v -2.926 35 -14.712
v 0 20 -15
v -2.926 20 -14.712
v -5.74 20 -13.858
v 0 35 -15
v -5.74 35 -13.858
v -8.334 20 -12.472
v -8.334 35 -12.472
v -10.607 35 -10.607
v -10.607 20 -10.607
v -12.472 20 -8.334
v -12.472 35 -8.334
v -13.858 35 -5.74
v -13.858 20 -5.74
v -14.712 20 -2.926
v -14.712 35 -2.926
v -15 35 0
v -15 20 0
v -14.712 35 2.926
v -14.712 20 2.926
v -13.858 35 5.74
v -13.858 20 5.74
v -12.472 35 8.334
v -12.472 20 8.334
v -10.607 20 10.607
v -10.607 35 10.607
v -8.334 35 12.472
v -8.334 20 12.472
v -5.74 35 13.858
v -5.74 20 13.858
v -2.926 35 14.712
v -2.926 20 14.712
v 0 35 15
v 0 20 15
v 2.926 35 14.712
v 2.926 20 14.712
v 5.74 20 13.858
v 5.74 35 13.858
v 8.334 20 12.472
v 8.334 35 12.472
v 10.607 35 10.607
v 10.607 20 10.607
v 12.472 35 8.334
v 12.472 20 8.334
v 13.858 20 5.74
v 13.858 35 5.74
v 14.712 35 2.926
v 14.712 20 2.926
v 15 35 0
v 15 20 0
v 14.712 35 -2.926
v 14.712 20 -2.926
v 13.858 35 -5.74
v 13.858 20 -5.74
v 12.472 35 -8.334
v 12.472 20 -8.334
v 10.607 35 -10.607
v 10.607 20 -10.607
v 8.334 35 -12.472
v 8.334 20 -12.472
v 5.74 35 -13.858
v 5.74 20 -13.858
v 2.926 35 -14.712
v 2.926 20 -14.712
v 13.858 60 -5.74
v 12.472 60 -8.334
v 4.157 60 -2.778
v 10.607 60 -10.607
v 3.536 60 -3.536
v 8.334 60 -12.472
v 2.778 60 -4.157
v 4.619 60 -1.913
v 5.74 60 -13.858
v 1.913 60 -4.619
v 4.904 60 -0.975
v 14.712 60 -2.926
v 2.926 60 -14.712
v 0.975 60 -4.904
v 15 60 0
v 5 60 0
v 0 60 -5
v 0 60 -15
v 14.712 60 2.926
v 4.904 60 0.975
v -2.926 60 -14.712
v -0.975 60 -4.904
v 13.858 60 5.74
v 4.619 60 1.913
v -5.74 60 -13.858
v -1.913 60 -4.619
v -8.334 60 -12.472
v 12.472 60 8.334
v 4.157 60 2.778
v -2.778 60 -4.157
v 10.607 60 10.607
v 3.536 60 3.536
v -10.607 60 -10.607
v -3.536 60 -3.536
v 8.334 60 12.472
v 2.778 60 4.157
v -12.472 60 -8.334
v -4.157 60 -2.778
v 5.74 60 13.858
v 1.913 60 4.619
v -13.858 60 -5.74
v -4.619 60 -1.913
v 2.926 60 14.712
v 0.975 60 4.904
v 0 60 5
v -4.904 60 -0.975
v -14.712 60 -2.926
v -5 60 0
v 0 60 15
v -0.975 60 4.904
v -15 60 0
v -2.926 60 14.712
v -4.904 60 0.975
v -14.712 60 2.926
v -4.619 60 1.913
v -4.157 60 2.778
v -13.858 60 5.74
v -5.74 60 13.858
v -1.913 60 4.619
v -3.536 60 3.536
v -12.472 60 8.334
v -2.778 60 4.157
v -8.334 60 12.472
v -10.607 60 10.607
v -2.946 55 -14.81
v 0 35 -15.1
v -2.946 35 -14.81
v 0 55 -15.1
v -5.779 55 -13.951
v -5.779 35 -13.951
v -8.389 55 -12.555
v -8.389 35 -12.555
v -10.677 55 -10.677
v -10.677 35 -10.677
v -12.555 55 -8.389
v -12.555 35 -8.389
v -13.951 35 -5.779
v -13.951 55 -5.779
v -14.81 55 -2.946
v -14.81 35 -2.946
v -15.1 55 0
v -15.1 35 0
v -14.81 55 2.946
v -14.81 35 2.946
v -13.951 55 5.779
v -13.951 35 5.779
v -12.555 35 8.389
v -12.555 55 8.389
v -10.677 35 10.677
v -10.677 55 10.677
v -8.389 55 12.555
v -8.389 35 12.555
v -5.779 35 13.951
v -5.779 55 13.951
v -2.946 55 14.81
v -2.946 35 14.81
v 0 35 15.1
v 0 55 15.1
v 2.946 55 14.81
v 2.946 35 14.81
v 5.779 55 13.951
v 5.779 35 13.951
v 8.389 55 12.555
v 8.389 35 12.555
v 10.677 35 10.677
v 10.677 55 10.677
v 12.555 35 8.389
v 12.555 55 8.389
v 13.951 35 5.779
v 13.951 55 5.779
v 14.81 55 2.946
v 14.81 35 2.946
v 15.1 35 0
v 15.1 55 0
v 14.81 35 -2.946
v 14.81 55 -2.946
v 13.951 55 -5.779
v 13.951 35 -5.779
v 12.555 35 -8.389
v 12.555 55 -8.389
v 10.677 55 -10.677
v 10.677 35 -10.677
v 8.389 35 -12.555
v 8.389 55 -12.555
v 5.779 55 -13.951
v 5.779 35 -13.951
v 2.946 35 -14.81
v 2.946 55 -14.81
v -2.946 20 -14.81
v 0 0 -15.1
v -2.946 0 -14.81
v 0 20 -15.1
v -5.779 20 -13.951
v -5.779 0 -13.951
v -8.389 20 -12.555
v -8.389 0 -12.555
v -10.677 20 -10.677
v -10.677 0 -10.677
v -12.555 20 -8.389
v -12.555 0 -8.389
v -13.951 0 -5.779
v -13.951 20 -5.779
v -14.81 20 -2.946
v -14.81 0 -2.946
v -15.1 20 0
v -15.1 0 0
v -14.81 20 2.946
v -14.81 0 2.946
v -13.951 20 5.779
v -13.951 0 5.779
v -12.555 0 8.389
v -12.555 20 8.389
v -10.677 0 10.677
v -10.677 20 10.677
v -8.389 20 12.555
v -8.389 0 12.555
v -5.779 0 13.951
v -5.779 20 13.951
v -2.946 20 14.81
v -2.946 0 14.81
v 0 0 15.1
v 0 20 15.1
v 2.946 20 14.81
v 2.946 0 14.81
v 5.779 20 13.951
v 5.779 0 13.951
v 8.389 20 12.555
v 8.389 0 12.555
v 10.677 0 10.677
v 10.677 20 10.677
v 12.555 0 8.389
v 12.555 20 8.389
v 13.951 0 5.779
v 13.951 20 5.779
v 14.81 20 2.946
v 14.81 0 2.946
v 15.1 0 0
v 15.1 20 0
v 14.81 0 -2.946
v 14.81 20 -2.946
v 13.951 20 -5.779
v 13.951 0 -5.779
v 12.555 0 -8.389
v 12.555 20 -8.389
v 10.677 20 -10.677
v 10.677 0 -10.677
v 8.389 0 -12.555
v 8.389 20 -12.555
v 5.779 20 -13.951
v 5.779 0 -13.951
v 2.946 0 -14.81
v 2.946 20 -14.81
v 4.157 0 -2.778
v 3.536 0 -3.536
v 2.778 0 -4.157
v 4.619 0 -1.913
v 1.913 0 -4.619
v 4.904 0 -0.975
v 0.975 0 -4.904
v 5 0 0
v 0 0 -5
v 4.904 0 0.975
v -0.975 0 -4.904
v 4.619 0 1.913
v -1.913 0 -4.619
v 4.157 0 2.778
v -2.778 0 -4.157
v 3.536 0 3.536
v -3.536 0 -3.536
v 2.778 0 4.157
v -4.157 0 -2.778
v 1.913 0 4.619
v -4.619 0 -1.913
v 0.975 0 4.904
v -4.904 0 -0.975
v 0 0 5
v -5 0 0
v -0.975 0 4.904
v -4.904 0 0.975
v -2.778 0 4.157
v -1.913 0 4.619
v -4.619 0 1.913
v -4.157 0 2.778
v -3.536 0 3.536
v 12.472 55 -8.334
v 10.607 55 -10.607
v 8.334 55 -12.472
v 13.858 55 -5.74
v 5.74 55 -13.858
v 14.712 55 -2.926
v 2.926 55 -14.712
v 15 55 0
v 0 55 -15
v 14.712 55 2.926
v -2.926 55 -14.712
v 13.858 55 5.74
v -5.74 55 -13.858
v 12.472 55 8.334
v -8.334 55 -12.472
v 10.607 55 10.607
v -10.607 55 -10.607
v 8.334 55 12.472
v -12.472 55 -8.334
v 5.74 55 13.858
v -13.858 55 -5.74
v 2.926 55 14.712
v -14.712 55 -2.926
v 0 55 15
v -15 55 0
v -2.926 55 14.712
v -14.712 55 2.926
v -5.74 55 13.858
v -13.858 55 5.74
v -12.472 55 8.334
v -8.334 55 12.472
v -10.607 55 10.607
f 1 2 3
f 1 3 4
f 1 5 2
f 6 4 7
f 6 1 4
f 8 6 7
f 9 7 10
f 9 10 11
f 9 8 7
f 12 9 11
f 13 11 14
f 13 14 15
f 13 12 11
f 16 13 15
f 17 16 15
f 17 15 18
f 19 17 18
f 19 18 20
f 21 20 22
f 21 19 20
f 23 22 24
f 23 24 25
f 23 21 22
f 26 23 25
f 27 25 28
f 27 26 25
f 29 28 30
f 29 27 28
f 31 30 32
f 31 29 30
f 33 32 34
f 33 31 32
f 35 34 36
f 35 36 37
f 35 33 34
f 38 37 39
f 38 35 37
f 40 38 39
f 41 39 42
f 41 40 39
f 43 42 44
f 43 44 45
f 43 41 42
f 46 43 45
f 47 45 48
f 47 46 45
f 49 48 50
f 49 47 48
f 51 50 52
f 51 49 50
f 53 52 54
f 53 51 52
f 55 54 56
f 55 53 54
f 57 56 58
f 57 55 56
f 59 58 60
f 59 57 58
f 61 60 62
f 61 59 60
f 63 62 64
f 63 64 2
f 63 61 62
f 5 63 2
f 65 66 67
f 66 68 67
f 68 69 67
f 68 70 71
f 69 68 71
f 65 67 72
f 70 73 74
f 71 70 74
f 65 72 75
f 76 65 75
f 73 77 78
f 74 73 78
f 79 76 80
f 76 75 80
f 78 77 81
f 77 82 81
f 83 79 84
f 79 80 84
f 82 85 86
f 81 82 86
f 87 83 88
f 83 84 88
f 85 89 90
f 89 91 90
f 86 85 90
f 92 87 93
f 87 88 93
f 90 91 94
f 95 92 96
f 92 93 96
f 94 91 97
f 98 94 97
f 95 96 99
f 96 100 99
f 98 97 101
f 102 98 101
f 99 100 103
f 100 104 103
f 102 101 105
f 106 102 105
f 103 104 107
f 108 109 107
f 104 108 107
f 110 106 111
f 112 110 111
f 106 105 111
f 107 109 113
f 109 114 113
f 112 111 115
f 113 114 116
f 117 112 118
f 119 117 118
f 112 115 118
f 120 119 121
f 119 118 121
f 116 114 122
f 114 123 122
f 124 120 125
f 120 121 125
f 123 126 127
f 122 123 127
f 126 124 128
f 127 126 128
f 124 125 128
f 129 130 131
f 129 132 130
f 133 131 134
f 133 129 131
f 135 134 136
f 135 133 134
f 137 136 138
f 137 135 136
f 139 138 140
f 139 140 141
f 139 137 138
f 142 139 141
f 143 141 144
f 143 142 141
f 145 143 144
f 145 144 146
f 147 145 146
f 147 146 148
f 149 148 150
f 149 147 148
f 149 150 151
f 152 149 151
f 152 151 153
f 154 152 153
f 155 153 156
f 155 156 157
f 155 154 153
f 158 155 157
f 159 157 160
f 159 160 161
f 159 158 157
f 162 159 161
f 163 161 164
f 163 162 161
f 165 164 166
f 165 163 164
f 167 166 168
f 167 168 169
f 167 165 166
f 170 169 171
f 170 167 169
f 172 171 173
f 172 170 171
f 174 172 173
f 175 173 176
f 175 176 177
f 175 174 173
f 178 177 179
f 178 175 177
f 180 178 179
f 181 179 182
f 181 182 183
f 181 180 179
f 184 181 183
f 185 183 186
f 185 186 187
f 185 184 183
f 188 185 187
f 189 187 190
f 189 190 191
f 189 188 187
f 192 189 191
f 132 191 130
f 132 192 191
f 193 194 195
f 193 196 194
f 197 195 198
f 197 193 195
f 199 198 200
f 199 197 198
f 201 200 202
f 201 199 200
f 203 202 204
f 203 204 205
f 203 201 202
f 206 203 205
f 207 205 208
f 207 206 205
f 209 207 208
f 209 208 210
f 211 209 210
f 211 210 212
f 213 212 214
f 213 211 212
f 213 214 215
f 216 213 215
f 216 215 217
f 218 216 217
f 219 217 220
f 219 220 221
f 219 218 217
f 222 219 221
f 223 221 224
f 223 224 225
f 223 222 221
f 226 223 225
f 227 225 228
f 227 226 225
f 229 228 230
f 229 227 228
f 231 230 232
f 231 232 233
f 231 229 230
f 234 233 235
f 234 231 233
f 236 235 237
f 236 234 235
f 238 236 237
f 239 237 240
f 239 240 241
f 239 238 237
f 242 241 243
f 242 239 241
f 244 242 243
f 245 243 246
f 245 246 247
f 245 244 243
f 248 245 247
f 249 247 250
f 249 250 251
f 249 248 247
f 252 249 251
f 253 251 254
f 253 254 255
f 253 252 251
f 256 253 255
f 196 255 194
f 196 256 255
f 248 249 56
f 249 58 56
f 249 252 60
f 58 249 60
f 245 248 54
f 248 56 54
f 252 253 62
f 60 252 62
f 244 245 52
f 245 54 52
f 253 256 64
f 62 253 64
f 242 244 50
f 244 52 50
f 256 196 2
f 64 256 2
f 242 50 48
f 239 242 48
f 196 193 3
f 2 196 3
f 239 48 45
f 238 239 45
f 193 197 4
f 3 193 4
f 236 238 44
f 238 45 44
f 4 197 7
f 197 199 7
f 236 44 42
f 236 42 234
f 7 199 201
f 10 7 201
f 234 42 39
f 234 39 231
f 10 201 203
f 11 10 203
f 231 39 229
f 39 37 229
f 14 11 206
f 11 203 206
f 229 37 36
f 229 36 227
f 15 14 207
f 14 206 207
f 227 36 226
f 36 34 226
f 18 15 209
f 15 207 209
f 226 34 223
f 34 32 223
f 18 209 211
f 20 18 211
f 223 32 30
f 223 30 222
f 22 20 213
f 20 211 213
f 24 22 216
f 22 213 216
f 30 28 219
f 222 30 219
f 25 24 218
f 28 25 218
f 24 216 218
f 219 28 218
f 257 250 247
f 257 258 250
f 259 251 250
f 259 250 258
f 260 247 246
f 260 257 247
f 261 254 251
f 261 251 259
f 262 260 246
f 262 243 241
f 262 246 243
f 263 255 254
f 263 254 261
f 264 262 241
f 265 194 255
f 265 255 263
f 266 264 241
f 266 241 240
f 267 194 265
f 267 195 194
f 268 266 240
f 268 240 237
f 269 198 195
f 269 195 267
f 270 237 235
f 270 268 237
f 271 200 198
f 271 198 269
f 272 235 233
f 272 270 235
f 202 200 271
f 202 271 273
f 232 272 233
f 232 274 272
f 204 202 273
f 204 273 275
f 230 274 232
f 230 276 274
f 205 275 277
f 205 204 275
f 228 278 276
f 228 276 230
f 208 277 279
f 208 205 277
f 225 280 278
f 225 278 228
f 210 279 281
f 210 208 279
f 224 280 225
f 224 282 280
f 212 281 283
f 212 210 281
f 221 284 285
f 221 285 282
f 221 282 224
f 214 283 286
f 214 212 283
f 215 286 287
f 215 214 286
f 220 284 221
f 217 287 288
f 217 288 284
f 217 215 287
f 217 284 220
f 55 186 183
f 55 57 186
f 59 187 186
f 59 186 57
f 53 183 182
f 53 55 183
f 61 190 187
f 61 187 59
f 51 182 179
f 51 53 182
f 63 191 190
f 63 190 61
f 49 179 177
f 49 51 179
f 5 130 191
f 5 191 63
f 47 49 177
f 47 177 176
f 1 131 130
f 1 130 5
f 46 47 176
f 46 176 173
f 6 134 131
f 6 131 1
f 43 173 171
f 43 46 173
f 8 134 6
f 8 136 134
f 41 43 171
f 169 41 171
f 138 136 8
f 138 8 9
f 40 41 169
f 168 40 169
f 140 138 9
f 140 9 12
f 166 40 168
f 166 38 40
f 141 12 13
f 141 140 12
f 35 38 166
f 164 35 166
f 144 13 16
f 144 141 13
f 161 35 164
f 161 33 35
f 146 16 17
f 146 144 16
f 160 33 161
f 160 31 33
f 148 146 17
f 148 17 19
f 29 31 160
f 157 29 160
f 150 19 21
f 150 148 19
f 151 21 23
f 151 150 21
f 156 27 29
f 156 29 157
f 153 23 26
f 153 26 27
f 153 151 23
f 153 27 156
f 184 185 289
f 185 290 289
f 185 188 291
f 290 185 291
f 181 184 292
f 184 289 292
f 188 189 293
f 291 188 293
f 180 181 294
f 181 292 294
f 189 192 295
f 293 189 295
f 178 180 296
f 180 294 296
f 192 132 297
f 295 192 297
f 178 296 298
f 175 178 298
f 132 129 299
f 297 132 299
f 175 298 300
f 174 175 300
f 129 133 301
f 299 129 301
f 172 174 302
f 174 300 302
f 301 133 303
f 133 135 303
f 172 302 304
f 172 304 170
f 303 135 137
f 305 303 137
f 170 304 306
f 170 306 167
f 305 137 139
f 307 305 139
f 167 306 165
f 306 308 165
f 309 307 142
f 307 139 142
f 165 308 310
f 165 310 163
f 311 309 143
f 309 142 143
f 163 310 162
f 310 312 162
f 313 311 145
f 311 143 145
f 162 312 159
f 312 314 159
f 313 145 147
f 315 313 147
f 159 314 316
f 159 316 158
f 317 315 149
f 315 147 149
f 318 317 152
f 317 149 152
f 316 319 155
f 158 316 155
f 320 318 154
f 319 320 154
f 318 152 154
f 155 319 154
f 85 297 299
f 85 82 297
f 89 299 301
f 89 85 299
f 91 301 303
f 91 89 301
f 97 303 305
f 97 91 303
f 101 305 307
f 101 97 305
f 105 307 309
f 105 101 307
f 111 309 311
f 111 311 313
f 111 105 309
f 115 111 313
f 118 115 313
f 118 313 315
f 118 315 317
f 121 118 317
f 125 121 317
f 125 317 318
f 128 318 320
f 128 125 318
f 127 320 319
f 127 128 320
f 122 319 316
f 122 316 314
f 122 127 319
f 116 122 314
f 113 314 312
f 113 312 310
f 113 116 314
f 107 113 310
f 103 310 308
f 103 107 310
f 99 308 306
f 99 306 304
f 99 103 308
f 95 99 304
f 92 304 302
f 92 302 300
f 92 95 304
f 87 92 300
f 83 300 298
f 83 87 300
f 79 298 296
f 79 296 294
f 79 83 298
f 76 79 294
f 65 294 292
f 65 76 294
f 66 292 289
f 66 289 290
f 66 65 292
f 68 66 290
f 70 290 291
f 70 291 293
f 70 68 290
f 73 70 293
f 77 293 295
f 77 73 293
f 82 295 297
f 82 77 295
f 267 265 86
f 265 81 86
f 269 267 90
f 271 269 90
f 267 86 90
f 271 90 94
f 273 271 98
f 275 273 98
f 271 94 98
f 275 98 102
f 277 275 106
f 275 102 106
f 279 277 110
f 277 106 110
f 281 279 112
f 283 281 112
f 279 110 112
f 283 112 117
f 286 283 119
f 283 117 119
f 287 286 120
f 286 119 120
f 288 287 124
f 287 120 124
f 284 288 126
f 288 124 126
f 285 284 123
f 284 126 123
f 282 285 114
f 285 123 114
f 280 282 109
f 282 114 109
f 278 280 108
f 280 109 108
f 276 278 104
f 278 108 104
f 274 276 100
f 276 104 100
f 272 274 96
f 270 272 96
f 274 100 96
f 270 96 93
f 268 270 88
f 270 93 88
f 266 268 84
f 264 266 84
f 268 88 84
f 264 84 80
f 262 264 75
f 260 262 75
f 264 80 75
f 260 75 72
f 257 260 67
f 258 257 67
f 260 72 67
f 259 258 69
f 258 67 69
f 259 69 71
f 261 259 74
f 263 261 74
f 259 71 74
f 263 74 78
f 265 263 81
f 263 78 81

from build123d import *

# Parameters (mm, degrees)
SKETCH1_W   = 10
SKETCH1_H   = 60
SKETCH1_W_2 = 0.1
SKETCH1_H_2 = 20


with BuildPart() as part:
    # Sketch1 → Revolve1 (revolve)
    with BuildSketch(Plane.XY, mode=Mode.PRIVATE) as revolve1_sk:
        with Locations((10, 30)):
            Rectangle(SKETCH1_W, SKETCH1_H)
        with Locations((15.05, 45)):
            Rectangle(SKETCH1_W_2, SKETCH1_H_2)
        with Locations((15.05, 10)):
            Rectangle(SKETCH1_W_2, SKETCH1_H_2)
    revolve(revolve1_sk.sketch.rotate(Axis((0, 0, 0), (0, 1, 0)), 90), axis=Axis((0, 0, 0), (0, 1, 0)))


solid = part.part
